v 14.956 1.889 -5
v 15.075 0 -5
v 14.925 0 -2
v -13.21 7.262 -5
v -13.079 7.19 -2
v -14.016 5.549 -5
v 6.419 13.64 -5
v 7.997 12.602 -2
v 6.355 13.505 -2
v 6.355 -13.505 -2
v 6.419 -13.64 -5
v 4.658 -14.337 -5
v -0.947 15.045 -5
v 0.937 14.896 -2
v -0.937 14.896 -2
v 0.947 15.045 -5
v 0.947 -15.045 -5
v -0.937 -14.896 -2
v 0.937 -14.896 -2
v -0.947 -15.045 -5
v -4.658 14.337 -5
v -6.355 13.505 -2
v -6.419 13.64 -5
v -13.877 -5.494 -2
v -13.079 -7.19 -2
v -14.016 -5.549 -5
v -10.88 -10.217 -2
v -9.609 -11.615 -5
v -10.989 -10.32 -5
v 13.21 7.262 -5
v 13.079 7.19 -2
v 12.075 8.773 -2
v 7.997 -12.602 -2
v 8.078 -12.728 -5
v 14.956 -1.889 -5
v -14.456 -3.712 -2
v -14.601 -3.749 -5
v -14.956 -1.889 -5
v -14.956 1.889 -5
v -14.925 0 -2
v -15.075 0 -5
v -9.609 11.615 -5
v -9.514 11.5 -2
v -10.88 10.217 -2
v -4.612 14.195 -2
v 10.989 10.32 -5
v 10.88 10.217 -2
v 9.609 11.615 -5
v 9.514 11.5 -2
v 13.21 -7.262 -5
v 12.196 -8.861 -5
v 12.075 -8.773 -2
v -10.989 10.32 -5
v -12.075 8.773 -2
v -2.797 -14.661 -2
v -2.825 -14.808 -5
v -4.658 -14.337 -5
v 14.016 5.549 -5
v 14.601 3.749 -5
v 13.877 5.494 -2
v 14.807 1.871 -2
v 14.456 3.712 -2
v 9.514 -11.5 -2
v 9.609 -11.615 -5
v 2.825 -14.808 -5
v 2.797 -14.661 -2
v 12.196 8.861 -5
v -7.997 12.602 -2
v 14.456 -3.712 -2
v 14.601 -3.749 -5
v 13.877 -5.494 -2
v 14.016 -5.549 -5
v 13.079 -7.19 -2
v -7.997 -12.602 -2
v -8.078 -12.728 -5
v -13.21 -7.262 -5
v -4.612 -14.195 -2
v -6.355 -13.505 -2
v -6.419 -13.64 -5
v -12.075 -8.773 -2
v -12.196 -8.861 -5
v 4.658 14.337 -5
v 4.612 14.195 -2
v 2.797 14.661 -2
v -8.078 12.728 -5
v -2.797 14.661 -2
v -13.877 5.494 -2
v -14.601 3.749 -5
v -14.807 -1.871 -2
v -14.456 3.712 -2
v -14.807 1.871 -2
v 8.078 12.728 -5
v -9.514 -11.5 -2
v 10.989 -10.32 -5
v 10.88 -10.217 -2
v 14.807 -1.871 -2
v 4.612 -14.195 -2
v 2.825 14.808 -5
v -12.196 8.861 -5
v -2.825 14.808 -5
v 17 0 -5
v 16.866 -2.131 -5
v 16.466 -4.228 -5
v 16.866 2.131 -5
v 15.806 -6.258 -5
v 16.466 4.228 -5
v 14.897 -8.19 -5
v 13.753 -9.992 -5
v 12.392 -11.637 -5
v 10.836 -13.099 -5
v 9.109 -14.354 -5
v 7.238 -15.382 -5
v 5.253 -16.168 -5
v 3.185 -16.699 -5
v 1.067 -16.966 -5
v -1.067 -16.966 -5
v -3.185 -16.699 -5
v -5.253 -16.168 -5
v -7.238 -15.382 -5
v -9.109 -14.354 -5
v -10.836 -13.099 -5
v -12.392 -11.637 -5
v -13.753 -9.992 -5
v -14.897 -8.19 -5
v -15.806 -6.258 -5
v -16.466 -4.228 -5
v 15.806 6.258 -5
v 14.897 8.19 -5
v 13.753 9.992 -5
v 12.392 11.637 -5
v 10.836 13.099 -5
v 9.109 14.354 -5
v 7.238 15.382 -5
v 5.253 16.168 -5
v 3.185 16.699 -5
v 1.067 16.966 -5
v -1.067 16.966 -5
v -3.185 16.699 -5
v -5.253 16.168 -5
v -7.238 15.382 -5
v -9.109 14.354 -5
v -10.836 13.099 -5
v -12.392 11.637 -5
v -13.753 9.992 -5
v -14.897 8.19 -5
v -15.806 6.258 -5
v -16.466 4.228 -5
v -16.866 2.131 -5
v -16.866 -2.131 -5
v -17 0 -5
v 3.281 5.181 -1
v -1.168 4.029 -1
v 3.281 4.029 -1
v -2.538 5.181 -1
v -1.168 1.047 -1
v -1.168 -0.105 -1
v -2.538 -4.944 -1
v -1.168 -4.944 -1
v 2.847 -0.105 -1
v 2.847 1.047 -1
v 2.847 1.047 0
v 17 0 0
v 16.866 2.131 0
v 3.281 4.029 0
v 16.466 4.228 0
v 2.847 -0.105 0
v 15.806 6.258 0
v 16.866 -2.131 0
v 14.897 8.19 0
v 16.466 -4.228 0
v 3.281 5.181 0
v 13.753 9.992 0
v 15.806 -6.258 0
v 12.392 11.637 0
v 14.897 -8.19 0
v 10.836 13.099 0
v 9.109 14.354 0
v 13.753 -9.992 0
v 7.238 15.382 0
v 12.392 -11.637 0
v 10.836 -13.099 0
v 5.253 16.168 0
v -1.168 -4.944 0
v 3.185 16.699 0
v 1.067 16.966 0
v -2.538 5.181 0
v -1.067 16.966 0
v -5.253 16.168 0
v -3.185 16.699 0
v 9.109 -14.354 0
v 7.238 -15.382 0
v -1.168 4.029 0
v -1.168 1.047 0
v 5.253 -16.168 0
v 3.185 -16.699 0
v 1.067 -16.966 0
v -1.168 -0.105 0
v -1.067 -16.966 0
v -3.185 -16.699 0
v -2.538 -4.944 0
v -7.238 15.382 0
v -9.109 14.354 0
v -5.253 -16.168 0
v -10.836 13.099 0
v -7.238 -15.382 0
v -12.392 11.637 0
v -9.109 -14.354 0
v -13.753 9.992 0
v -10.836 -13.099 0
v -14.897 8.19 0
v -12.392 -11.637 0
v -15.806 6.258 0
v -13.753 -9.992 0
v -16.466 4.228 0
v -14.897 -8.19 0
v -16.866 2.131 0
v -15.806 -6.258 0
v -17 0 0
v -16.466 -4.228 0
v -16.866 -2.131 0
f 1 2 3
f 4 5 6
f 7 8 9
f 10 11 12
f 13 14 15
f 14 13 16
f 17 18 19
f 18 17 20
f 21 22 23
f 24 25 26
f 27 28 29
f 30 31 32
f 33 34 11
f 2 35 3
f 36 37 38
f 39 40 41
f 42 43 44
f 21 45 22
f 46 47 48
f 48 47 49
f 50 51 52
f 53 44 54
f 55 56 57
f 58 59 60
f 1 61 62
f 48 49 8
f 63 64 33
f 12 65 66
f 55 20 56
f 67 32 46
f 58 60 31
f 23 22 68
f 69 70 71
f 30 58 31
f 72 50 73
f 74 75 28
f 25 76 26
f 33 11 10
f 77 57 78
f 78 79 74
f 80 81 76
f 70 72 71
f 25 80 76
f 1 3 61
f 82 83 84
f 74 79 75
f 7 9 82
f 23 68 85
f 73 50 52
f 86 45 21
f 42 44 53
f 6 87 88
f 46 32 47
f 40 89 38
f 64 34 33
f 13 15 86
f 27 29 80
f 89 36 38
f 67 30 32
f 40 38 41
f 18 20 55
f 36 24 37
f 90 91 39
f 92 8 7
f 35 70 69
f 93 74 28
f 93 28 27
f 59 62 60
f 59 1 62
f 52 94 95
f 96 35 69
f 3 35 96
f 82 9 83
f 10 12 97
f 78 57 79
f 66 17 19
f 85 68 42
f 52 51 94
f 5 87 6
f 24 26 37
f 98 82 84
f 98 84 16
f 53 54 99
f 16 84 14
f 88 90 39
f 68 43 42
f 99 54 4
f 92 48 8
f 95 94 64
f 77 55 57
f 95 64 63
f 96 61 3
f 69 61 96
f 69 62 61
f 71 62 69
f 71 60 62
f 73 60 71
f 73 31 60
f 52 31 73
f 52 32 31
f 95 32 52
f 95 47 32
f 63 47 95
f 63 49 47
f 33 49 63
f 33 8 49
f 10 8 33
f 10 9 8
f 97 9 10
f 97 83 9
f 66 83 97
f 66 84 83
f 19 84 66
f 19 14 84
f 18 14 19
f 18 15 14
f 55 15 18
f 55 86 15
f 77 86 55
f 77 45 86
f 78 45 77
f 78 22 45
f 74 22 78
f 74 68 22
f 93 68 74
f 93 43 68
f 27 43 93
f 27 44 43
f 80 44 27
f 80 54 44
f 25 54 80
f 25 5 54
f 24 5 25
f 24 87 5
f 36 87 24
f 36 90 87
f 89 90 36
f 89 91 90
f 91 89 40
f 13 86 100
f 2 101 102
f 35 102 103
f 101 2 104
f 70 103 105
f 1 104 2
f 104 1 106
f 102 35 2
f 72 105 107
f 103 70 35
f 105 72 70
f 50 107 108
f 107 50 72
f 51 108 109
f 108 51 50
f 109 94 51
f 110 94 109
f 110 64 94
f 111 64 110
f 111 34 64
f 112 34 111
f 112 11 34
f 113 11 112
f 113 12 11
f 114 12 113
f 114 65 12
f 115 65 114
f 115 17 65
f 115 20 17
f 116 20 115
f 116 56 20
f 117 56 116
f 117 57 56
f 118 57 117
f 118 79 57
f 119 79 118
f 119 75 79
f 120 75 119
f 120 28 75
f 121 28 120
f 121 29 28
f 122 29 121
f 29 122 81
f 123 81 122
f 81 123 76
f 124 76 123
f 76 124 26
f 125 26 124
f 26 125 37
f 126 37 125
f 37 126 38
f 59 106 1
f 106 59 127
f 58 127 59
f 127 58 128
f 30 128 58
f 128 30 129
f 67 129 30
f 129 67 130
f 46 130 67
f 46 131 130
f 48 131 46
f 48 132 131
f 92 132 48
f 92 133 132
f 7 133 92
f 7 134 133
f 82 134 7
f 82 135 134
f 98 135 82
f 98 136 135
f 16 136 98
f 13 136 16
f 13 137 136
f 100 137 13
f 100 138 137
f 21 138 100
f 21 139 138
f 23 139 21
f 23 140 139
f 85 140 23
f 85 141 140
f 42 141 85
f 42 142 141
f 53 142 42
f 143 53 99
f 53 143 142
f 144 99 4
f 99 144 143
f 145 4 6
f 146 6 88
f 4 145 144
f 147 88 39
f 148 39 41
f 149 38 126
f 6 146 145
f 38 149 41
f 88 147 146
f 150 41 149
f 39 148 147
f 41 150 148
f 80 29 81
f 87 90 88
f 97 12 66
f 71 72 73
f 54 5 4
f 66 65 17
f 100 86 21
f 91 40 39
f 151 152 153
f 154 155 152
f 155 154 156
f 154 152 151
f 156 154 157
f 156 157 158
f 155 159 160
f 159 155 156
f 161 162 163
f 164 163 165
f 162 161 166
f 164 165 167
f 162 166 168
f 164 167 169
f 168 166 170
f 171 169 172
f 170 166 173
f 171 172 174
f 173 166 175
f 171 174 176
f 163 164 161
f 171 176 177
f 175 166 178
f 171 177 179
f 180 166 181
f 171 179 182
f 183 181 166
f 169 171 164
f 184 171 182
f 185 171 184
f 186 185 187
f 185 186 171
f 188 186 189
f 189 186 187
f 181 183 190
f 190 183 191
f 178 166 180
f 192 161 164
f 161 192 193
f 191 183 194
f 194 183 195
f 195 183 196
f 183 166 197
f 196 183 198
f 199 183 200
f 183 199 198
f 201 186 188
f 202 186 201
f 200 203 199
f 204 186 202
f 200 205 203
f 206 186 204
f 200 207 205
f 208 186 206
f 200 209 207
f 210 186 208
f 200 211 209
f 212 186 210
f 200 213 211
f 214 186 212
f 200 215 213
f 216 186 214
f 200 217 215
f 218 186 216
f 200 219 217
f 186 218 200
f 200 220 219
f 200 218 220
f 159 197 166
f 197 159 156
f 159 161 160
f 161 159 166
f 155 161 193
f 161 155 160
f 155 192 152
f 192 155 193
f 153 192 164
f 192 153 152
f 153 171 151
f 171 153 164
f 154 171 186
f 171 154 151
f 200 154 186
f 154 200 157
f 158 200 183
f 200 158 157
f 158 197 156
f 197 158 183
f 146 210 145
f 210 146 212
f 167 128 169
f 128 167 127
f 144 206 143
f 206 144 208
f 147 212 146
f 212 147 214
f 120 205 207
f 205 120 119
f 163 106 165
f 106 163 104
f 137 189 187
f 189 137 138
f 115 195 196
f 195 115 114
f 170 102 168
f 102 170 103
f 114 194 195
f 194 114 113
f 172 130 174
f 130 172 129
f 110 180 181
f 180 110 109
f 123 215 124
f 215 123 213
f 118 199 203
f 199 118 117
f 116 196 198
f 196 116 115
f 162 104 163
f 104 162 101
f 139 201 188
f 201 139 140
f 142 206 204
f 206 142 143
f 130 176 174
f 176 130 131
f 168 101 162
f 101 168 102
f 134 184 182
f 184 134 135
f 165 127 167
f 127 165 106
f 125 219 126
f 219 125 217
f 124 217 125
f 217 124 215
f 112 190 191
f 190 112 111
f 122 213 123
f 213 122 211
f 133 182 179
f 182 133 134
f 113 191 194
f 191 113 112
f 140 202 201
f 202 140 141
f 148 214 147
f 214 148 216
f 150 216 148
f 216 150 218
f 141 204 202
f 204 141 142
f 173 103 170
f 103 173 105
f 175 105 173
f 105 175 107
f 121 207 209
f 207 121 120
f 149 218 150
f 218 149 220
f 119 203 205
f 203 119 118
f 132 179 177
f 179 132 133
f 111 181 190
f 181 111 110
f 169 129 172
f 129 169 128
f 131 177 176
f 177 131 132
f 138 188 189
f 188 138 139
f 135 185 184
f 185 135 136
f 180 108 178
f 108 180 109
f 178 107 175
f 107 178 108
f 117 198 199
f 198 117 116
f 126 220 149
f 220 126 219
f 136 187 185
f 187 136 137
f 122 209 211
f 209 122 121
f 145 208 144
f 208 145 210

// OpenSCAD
$fn = 50;

difference() {
	union() {
		translate(v = [0, 0, -5.0]) {
			cylinder(h = 5, r = 17.0);
		}
	}
	union() {
		#translate(v = [0, 0, -5.0]) {
			cylinder(h = 3, r1 = 15.075, r2 = 14.925);
		}
		translate(v = [0, 0, -1]) {
			linear_extrude(height = 1) {
				text(font = "Impact", halign = "center", size = 10, text = "F", valign = "center");
			}
		}
	}
}
